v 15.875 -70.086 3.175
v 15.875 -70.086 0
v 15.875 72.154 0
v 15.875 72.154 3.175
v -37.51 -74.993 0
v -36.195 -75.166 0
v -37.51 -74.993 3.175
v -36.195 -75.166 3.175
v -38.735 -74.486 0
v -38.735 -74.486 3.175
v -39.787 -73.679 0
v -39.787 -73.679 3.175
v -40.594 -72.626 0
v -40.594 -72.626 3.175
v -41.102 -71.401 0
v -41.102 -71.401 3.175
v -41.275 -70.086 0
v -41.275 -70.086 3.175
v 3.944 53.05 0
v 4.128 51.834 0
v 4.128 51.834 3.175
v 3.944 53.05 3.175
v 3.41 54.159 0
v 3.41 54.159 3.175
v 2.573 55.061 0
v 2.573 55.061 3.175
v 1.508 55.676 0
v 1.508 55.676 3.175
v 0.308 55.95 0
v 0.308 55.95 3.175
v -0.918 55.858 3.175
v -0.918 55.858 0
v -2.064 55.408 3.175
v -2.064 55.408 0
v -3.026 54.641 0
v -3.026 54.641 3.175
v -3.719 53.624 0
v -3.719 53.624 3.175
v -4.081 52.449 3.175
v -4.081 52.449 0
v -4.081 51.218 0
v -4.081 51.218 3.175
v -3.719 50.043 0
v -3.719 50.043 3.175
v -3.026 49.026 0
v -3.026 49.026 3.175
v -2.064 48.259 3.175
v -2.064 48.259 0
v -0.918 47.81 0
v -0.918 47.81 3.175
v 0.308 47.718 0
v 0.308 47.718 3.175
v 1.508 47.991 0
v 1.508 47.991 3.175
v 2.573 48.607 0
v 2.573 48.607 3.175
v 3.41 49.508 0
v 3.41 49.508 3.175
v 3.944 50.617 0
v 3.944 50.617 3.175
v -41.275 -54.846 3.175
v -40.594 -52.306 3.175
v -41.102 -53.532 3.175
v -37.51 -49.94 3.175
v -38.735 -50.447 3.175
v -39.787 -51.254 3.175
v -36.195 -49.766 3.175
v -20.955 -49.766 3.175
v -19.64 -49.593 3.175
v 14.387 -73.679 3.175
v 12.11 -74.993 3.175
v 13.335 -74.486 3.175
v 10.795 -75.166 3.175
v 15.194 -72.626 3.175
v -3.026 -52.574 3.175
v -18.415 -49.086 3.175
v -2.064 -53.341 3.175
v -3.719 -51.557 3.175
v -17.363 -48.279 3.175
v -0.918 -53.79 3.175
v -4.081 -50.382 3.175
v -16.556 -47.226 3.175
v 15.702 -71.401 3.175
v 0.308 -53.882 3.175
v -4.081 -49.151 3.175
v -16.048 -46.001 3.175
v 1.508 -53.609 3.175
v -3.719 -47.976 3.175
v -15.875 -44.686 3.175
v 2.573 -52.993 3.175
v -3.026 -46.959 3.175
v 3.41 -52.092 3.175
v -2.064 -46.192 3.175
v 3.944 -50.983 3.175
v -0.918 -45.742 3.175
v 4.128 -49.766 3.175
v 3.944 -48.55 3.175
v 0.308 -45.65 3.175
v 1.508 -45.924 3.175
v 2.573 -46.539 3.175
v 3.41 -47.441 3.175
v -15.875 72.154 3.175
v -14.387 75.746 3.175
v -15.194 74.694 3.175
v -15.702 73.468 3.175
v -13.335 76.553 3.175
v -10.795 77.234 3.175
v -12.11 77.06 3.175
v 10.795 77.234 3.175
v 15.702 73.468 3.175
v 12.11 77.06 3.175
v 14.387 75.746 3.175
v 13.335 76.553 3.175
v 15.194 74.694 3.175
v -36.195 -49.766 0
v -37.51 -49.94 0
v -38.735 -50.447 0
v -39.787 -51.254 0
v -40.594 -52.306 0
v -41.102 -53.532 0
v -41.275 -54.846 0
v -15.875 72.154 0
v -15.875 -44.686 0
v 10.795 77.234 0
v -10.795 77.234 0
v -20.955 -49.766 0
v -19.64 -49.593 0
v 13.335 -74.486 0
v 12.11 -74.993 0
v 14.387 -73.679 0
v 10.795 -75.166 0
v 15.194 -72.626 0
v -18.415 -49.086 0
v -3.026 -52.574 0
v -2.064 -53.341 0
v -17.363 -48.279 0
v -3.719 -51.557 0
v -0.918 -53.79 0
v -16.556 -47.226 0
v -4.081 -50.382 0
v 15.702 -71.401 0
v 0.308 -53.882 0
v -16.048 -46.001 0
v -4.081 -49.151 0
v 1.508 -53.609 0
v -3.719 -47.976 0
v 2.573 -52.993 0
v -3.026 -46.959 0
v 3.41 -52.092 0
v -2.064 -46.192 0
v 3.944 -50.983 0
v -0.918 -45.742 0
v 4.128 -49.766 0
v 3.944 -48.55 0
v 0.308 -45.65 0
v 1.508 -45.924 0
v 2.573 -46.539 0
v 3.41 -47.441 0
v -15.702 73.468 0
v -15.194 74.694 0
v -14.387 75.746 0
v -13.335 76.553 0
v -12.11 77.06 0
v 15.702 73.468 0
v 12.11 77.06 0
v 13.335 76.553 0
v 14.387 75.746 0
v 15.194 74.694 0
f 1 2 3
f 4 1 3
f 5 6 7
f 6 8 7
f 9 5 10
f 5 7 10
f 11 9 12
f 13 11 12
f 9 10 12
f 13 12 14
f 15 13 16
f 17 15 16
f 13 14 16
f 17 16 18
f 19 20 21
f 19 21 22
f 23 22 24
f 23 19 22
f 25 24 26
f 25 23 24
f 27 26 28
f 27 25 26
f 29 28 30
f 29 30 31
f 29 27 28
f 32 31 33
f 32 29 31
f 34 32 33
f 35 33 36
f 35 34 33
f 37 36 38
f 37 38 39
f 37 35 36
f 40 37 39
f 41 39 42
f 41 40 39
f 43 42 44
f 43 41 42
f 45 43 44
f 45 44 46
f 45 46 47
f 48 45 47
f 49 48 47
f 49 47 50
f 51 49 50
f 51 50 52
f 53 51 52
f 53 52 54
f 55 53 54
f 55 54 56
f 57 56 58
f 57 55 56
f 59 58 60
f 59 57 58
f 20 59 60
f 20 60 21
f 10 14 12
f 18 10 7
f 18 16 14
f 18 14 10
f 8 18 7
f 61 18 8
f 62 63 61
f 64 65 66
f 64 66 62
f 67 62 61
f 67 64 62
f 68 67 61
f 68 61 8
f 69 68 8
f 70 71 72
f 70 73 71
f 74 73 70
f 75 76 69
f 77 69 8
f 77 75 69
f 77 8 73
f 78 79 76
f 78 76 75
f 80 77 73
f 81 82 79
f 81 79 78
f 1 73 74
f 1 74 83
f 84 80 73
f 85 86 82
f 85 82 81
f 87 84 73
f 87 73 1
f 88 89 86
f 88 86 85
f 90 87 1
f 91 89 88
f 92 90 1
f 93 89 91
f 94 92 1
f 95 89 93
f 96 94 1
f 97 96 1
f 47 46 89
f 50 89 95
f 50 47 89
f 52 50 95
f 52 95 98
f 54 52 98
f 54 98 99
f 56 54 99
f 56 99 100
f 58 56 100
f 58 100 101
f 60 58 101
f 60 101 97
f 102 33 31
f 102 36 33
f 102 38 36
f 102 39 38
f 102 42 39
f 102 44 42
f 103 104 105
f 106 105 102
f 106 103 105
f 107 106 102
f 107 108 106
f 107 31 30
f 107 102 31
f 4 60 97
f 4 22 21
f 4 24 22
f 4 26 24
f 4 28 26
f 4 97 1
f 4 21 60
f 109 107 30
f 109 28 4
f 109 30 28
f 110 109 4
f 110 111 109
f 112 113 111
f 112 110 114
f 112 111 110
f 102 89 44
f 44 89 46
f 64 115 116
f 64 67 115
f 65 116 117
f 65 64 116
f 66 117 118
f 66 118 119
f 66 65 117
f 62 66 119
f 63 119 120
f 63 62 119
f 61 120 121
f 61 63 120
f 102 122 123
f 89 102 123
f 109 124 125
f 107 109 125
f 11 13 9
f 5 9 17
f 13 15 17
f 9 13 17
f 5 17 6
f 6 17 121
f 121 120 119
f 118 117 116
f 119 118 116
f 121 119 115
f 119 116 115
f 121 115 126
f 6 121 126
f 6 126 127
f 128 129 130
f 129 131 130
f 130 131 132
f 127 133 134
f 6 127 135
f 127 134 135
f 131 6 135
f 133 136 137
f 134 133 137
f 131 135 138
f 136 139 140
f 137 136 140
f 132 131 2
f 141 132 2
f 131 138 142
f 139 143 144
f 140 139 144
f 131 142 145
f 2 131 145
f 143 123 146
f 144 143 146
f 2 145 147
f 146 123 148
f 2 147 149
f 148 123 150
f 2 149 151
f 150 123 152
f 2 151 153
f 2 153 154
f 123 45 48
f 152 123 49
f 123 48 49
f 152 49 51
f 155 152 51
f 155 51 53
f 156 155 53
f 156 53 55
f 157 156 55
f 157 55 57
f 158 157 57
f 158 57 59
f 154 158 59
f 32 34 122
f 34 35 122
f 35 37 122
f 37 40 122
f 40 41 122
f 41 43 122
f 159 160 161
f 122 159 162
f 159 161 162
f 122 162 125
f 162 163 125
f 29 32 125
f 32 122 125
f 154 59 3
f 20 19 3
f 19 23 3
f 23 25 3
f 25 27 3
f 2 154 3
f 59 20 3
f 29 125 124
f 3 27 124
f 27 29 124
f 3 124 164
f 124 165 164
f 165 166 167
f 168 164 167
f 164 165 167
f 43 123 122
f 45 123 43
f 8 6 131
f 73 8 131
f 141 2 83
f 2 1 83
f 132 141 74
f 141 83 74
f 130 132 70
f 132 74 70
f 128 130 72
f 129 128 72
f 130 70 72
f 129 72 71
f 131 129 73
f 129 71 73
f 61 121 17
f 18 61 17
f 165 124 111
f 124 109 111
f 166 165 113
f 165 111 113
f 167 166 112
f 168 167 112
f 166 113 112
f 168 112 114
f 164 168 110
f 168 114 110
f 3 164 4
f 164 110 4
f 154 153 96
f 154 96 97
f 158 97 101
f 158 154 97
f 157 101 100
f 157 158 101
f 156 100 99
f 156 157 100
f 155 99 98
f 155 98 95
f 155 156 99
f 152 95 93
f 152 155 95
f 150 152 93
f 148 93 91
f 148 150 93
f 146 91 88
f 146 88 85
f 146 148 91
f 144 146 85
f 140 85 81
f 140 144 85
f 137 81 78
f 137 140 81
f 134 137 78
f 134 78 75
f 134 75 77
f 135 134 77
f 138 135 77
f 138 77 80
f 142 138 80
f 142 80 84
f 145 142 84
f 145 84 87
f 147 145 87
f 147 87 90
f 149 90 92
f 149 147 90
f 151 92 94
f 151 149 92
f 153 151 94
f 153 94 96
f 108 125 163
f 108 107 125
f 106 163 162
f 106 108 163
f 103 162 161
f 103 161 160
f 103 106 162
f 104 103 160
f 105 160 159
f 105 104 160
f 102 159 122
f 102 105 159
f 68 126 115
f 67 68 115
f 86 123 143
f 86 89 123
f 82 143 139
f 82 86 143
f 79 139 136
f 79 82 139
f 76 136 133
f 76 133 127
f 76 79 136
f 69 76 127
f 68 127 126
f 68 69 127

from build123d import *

# Parameters (mm, degrees)
F0_R     = 4.1275
F1_DEPTH = 3.175
F2_R     = 5.08


with BuildPart() as f1:
    # F0 (on Top) → F1 (new body)
    with BuildSketch(Plane.XY):
        Polygon((15.875, 77.233556), (-15.875, 77.233556), (-15.875, -49.766444), (-41.275, -49.766444), (-41.275, -75.166444), (15.875, -75.166444), align=None)
        with Locations((0, -49.766444)):
            Circle(F0_R, mode=Mode.SUBTRACT)
        with Locations((0, 51.833556)):
            Circle(F0_R, mode=Mode.SUBTRACT)
    extrude(amount=F1_DEPTH)

    # F2
    f2_edges = [f1.edges().sort_by_distance(p)[0] for p in [
        (-15.875, 77.233556, 1.5875),
        (15.875, 77.233556, 1.5875),
        (-15.875, -49.766444, 1.5875),
        (-41.275, -49.766444, 1.5875),
        (-41.275, -75.166444, 1.5875),
        (15.875, -75.166444, 1.5875),
    ]]
    fillet(f2_edges, radius=F2_R)


solid = f1.part
